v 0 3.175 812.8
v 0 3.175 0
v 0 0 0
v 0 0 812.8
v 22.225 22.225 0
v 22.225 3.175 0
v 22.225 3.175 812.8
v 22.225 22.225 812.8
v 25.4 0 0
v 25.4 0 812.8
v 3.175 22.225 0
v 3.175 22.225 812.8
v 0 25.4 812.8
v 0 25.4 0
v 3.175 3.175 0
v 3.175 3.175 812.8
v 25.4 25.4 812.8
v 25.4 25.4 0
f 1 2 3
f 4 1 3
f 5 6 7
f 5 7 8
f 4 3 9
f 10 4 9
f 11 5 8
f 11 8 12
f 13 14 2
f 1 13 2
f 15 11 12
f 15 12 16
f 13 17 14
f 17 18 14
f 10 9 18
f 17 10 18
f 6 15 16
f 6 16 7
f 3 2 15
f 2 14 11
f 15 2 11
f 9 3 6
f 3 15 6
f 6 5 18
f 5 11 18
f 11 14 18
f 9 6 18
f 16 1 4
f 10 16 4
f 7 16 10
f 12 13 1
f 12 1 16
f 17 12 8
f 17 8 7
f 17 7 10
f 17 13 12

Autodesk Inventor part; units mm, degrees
ref_plane "YZ Plane" through (0, 0, 0) normal (1, 0, 0) x (0, 1, 0)
ref_plane "XZ Plane" through (0, 0, 0) normal (0, 1, 0) x (-1, 0, 0)
ref_plane "XY Plane" through (0, 0, 0) normal (0, 0, 1) x (1, 0, 0)
sketch "Sketch1" plane through (0, 0, 0) normal (0, 0, 1) x (1, 0, 0)
  line L0 (0, 0) -> (25.4, 0)
  line L1 (25.4, 0) -> (25.4, 25.4)
  line L2 (25.4, 25.4) -> (0, 25.4)
  line L3 (0, 25.4) -> (0, 0)
  line L4 (0, 0) -> (0, 3.175)
  line L5 (0, 3.175) -> (3.175, 3.175)
  line L6 (3.175, 3.175) -> (22.225, 3.175)
  line L7 (22.225, 3.175) -> (22.225, 22.225)
  line L8 (22.225, 22.225) -> (3.175, 22.225)
  line L9 (3.175, 22.225) -> (3.175, 3.175)
  dimension "d0" = 25.4
  dimension "d1" = 25.4
  dimension "d2" = 3.175
  dimension "d3" = 3.175
  dimension "d4" = 19.05
  dimension "d5" = 19.05
extrude "Extrusion1" add sketch "Sketch1" along normal blind 812.8
properties part number "32inSquarePipe"
